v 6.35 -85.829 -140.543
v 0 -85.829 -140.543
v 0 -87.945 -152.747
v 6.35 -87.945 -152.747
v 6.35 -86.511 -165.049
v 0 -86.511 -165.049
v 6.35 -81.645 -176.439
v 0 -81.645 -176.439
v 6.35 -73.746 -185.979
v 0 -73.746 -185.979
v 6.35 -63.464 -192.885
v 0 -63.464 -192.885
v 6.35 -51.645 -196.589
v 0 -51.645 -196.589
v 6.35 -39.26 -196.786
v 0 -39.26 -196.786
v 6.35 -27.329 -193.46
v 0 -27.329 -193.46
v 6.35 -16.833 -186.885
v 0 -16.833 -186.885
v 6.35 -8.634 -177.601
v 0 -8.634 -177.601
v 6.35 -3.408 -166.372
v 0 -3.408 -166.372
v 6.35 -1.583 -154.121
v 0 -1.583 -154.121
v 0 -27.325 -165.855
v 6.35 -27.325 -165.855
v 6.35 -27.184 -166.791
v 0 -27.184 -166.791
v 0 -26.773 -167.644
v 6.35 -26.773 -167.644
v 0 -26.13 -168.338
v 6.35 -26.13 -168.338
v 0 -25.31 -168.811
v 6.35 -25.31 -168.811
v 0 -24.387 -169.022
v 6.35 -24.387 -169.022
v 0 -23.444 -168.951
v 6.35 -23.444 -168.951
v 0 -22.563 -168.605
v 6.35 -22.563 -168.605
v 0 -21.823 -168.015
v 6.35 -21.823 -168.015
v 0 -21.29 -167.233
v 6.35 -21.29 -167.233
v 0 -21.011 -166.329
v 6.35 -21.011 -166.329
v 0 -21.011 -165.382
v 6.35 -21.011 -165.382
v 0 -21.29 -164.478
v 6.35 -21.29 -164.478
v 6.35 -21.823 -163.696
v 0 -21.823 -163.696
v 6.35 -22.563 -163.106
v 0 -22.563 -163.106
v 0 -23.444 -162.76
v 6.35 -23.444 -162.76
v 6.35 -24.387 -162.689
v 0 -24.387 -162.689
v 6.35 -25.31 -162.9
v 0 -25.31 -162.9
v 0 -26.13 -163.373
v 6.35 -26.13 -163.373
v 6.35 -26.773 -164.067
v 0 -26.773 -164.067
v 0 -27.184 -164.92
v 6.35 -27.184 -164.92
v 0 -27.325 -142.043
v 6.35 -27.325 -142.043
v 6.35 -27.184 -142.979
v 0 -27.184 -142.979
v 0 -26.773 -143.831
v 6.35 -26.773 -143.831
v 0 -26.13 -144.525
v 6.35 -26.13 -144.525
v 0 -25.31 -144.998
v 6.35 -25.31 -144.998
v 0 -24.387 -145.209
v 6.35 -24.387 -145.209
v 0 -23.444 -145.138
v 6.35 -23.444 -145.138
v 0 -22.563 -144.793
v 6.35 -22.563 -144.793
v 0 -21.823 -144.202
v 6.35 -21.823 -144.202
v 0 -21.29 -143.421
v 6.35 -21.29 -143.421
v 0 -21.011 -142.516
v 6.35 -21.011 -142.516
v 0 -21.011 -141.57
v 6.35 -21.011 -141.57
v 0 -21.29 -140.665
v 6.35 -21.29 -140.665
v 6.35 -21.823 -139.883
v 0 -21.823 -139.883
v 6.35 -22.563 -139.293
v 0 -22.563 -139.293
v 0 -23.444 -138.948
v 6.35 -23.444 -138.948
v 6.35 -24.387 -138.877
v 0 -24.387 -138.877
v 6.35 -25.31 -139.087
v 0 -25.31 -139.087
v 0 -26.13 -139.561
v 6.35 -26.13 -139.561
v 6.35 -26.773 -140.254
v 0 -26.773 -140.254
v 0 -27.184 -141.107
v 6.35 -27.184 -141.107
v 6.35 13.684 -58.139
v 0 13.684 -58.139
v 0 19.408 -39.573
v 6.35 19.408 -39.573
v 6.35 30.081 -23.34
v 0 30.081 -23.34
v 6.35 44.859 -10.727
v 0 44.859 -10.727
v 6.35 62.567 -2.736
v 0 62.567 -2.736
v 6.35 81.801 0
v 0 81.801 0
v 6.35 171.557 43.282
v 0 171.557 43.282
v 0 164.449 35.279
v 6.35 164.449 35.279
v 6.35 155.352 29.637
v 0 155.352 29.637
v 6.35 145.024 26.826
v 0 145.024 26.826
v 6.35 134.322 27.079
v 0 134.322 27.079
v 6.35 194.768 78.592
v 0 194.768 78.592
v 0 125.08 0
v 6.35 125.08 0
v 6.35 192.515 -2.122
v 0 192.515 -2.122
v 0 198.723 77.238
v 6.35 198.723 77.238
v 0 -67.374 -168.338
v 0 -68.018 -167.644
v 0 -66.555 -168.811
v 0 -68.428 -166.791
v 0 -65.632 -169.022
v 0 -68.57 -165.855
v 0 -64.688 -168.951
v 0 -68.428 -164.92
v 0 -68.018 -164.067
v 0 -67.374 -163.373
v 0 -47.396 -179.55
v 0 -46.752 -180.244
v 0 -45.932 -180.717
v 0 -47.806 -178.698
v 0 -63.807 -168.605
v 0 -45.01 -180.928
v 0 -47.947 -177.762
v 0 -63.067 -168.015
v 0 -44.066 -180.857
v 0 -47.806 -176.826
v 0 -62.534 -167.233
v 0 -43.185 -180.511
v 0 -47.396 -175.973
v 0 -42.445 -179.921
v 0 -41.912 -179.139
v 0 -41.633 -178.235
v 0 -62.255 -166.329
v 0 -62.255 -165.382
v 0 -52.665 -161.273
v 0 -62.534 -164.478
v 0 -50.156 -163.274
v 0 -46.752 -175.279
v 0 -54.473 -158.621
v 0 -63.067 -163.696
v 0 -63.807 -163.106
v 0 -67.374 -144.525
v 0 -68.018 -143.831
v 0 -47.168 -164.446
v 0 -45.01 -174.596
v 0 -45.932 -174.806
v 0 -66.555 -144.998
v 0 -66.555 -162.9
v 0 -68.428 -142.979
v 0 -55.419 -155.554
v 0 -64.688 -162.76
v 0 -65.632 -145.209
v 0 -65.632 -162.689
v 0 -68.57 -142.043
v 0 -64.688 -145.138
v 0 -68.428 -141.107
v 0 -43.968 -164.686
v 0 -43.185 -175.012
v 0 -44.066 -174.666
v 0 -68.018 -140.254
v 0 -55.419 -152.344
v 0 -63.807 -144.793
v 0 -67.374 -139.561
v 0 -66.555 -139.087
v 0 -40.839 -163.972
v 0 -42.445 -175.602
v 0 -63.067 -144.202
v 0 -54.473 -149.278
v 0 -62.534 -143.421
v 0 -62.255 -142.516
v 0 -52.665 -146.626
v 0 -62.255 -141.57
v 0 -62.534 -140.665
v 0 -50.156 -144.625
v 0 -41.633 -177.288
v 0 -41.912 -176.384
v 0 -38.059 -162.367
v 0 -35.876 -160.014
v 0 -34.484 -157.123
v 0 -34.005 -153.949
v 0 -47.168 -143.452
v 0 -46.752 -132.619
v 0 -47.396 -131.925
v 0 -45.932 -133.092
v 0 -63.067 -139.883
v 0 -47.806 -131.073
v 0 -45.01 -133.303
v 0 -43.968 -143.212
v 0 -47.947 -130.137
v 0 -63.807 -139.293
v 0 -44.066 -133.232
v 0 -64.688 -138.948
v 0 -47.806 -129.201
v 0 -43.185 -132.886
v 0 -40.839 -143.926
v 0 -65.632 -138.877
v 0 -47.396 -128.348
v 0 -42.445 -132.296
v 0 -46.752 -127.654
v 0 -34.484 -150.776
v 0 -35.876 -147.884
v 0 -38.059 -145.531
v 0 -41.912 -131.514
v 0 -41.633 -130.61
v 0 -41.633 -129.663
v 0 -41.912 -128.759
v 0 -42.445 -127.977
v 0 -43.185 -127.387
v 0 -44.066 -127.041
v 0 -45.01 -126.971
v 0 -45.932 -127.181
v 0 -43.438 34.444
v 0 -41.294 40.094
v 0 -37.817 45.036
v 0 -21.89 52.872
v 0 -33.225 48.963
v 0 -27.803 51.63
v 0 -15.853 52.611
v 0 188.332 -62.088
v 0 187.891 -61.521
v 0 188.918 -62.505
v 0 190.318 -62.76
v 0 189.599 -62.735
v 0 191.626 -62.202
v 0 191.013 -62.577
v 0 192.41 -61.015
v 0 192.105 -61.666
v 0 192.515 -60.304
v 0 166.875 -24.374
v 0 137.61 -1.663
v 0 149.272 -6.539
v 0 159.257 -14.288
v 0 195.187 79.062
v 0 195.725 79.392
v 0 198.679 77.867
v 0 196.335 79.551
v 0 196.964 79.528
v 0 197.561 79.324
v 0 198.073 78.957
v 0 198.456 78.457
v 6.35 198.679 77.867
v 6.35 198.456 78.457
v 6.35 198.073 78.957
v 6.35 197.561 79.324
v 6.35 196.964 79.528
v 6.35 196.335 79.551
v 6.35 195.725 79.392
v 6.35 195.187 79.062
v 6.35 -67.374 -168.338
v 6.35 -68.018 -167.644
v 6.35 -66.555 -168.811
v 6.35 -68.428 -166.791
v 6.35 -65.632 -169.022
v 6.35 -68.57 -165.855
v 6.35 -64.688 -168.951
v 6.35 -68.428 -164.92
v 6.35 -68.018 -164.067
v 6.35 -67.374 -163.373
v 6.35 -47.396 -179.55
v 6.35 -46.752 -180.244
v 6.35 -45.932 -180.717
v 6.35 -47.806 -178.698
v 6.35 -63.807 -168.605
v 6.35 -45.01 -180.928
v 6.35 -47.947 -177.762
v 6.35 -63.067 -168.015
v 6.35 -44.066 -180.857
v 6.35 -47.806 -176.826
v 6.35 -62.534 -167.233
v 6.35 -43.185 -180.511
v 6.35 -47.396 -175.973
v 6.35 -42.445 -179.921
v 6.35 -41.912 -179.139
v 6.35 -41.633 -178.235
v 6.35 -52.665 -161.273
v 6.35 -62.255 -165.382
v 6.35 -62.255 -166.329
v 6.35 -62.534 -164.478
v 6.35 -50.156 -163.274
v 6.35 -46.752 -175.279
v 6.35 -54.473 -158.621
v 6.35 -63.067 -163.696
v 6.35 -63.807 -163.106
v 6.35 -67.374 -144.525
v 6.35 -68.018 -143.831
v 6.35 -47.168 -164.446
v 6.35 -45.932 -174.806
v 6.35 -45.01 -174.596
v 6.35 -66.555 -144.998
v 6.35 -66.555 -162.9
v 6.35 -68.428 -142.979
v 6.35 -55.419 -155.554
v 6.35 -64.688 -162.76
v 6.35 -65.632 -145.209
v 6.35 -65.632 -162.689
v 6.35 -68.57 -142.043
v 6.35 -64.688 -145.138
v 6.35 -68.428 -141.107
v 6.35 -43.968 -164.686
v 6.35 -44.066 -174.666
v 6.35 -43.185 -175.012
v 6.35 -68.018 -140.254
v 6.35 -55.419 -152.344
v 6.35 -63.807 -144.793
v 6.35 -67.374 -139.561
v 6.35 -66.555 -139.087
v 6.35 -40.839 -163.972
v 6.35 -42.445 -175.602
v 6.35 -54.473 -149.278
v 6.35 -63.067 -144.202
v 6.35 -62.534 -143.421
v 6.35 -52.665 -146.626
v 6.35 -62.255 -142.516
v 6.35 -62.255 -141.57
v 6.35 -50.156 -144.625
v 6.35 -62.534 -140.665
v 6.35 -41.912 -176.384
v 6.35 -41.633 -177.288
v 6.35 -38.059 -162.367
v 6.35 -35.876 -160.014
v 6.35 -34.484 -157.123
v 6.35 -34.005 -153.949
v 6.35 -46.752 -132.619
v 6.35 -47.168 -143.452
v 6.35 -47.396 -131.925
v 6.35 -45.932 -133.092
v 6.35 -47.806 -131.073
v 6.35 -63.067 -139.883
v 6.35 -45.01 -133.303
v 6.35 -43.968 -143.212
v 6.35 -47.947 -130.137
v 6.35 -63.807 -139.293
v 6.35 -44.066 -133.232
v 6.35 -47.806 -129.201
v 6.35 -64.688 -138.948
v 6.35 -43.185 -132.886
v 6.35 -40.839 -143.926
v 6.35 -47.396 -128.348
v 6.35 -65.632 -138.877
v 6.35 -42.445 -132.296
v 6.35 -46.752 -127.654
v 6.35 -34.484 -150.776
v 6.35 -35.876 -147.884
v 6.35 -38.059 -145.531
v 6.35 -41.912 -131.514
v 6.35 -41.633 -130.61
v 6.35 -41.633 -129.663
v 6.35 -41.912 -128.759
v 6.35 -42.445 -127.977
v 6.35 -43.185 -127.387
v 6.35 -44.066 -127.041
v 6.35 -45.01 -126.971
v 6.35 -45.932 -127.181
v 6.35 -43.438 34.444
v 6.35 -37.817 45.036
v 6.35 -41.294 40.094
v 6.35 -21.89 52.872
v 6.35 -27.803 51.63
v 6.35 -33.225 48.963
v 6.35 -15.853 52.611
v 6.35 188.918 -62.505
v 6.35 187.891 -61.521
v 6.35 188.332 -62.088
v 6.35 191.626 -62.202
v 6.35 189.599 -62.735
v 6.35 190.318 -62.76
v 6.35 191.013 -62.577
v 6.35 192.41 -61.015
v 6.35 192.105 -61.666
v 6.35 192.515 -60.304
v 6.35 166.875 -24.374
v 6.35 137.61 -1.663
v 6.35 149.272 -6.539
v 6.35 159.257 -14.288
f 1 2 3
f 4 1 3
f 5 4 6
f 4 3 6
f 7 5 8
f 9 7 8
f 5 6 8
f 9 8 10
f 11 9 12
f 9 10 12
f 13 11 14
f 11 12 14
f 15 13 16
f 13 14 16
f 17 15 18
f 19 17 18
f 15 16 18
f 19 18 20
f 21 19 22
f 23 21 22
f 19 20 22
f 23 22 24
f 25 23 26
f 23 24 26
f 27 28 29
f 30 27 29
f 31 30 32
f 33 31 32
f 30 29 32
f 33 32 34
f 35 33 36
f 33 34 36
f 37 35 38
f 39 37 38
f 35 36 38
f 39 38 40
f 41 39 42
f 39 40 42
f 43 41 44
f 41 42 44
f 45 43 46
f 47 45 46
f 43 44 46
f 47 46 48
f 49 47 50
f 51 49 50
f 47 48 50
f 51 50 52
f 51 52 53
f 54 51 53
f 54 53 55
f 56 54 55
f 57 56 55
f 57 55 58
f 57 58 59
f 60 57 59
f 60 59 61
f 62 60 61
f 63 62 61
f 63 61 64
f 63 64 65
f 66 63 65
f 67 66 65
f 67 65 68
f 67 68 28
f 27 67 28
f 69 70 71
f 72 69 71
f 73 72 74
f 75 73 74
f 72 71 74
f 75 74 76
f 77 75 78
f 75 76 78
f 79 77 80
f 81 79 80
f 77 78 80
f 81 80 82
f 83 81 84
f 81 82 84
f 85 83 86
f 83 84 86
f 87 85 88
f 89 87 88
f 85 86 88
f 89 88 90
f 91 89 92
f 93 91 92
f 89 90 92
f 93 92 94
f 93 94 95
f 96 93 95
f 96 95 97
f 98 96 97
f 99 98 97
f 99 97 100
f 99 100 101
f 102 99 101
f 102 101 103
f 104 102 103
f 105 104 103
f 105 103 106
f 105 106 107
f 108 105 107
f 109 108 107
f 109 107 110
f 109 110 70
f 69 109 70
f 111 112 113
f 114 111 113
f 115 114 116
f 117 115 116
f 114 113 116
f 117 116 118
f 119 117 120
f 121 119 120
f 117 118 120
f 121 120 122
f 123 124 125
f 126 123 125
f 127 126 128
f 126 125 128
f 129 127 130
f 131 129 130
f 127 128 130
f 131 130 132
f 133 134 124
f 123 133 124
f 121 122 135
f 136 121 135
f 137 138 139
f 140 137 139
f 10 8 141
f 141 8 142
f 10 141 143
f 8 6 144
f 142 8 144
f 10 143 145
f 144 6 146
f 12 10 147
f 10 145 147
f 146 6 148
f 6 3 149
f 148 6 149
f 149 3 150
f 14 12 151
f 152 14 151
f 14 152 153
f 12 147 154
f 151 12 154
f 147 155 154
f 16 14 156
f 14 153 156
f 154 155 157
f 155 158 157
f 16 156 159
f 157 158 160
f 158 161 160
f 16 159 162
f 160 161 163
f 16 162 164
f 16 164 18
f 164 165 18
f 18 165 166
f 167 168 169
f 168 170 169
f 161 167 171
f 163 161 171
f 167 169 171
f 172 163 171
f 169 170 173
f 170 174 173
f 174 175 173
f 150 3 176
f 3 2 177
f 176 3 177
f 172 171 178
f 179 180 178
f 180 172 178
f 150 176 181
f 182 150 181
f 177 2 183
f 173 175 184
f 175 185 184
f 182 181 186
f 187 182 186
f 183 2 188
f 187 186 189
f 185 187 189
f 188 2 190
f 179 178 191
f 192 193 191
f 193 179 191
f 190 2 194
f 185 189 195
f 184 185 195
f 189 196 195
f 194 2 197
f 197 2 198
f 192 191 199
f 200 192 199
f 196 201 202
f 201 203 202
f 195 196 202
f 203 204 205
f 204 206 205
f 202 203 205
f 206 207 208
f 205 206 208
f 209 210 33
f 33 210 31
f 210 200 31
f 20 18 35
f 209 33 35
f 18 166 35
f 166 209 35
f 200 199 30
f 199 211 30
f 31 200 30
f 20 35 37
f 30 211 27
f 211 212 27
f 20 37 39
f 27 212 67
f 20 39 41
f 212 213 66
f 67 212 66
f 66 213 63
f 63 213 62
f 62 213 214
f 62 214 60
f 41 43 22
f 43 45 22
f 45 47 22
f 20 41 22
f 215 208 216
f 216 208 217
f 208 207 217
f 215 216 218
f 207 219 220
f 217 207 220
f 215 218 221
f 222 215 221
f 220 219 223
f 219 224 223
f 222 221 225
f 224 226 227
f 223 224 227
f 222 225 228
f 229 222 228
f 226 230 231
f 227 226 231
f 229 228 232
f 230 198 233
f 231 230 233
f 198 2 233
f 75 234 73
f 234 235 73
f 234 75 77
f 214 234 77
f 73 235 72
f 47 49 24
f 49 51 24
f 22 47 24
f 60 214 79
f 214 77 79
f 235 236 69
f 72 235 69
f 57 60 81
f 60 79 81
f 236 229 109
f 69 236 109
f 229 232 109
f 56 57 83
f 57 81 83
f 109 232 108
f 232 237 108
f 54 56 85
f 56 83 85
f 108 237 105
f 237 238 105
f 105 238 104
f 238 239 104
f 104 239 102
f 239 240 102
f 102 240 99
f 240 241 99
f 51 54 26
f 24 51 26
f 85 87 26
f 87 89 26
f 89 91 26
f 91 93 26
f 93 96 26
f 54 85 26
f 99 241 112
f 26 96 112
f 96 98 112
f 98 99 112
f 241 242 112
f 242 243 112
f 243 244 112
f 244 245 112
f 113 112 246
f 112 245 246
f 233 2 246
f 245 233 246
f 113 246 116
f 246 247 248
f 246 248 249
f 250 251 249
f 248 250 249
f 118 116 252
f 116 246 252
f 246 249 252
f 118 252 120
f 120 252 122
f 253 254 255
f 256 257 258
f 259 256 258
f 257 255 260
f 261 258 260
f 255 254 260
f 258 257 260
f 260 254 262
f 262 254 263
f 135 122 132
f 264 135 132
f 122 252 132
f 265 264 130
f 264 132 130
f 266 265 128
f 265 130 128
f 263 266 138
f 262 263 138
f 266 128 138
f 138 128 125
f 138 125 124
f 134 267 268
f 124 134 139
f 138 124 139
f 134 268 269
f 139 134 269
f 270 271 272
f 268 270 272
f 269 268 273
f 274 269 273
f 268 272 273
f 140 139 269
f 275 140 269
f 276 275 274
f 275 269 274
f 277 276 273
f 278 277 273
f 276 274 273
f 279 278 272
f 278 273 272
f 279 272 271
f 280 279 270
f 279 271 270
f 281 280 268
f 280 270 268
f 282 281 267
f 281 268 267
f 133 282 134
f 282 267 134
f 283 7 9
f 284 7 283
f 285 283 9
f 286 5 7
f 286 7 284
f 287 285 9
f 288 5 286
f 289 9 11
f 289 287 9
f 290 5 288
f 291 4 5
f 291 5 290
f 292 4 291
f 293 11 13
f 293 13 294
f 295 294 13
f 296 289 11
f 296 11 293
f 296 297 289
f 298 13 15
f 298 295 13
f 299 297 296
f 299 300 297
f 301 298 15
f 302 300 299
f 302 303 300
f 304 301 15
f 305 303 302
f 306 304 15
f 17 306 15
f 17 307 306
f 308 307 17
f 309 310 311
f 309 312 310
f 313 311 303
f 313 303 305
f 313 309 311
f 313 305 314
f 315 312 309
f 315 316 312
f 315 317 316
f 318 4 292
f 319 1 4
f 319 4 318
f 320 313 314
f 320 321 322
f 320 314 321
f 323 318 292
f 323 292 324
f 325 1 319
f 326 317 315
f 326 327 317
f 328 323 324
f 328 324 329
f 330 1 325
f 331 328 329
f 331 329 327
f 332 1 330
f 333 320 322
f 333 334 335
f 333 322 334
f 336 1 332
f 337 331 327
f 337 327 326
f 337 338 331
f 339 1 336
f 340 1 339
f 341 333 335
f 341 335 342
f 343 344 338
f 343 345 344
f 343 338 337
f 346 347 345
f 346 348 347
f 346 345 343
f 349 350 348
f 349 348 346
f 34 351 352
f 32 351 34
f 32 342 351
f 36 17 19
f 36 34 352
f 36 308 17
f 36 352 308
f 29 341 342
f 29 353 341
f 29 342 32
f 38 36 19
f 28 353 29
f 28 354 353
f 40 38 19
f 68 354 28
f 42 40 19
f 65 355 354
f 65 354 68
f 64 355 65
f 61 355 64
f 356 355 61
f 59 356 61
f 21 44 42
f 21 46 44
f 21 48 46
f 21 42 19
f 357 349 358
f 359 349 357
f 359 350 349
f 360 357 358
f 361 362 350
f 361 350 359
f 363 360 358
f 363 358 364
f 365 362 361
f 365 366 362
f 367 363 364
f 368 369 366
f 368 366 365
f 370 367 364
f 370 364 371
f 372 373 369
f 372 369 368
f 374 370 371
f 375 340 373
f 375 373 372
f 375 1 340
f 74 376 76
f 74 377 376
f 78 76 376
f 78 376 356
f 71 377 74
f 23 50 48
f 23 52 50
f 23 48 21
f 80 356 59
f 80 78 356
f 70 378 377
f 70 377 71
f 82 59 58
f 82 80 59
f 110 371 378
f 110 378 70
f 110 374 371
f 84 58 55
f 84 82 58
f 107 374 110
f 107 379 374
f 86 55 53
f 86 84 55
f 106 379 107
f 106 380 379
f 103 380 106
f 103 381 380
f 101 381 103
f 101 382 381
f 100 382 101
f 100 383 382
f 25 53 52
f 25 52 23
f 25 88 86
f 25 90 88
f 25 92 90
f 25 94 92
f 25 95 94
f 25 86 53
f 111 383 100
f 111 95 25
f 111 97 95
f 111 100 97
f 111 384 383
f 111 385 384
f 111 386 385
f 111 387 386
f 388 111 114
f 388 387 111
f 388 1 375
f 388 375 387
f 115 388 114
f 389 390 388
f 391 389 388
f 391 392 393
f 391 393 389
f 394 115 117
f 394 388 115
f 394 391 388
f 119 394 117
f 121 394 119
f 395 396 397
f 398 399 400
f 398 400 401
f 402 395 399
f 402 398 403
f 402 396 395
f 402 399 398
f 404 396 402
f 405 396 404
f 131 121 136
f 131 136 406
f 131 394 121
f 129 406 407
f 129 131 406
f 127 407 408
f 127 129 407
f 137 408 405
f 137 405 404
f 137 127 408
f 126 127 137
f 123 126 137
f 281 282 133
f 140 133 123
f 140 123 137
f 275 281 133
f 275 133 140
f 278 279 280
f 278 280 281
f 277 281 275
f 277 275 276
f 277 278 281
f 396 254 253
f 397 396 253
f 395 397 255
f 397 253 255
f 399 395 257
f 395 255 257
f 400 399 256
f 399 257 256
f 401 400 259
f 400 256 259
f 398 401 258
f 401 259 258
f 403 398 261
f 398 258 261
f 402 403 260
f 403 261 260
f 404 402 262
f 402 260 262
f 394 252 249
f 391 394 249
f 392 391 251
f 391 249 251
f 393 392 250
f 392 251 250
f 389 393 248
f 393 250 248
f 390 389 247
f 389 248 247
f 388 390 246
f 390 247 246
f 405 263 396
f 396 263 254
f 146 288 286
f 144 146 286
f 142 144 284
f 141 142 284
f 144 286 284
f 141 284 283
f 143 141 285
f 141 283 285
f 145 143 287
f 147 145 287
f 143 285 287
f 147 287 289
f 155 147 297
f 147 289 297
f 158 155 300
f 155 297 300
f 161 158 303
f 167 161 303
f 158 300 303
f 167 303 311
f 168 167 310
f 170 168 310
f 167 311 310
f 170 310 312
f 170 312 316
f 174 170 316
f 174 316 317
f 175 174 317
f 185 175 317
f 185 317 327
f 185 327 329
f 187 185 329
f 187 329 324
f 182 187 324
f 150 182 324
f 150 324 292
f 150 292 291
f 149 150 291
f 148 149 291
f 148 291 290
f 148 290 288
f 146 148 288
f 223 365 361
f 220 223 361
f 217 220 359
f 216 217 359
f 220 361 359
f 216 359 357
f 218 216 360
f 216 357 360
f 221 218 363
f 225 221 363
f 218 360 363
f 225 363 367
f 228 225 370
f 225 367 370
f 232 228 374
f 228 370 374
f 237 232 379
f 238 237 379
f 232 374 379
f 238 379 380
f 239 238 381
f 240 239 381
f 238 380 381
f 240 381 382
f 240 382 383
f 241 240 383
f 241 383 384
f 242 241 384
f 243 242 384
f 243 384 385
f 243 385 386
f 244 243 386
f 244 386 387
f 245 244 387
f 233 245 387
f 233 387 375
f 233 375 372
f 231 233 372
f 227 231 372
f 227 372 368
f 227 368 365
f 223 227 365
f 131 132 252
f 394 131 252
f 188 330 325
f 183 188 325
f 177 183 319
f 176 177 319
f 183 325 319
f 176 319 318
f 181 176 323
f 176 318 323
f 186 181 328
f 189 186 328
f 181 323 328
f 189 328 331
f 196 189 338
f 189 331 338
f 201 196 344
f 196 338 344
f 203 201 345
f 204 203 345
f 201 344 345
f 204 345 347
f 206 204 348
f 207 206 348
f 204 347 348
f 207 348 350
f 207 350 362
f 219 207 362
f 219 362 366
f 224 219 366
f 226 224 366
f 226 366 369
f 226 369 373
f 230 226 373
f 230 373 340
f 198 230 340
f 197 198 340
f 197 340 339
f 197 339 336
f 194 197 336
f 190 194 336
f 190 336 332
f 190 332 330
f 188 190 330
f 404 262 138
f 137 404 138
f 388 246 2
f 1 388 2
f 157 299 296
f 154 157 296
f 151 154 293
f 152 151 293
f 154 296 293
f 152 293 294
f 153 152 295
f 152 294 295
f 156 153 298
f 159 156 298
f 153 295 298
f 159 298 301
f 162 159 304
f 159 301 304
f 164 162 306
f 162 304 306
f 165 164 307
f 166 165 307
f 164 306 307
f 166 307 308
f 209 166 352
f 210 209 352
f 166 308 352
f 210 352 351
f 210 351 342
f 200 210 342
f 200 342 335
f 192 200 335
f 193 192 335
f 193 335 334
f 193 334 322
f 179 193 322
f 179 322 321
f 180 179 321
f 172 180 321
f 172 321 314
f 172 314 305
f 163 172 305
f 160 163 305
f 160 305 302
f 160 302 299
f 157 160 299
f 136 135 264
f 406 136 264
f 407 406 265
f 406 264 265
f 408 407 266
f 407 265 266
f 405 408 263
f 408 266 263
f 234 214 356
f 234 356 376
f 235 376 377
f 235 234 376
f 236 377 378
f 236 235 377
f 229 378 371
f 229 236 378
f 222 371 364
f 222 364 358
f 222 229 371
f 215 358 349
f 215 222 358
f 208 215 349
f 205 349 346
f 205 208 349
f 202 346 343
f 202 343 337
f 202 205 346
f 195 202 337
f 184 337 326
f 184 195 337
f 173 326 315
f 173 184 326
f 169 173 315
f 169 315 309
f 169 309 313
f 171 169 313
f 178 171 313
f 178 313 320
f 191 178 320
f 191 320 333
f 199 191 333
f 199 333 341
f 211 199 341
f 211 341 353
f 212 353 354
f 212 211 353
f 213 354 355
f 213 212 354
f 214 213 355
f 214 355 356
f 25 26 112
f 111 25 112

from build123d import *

# Parameters (mm, degrees)
F1_DEPTH = 6.35
F2_DEPTH = 6.35
F0_R     = 10.7670897693
F5_DEPTH = 6.35
F6_D     = 6.35


# Not quite as in the source:
# - a feature of the source that left no trace in its solid (it failed there, or was rolled back) is left out


with BuildPart() as f1:
    # F0 (on Right) → F1 (new body)
    with BuildSketch(Plane.YZ):
        with BuildLine():
            ThreePointArc((-1.5825573364, -153.9491721496), (-1.5826429755, -154.035180638), (-1.5828998925, -154.1211887854))
            Line((-1.5828998925, -154.1211887854), (13.683948877, -58.1386835494))
            ThreePointArc((13.683948877, -58.1386835494), (37.0236297514, -16.510860014), (81.800944289, 0))
            Line((81.800944289, 0), (125.0803981306, 0))
            ThreePointArc((125.0803981306, 0), (149.2715136598, -6.5386249673), (166.8746197449, -24.3738245223))
            Line((166.8746197449, -24.3738245223), (187.8910975974, -61.5208026845))
            ThreePointArc((187.8910975974, -61.5208026845), (190.6720383022, -62.6941019502), (192.5146989034, -60.3035237191))
            Line((192.5146989034, -60.3035237191), (192.5146989034, -2.1215420715))
            Line((192.5146989034, -2.1215420715), (198.7226175975, 77.2382490494))
            ThreePointArc((198.7226175975, 77.2382490494), (197.2700771229, 79.4482102797), (194.7679715475, 78.5918983278))
            Line((194.7679715475, 78.5918983278), (171.5573410493, 43.2821044094))
            ThreePointArc((171.5573410493, 43.2821044094), (155.3522029023, 29.6366600871), (134.3221352203, 27.0791405068))
            Line((134.3221352203, 27.0791405068), (-15.8528228172, 52.6105930486))
            ThreePointArc((-15.8528228172, 52.6105930486), (-33.2247403603, 48.9627075804), (-43.4379661828, 34.4444223576))
            Line((-43.4379661828, 34.4444223576), (-85.8287484087, -140.5429926023))
            ThreePointArc((-85.8287484087, -140.5429926023), (-37.9848929099, -111.2960762471), (-1.5825573364, -153.9491721496))
        make_face()
    extrude(amount=F1_DEPTH)

    # F0 (on Right) → F2 (join)
    with BuildSketch(Plane.YZ):
        with BuildLine():
            ThreePointArc((-1.5825573364, -153.9491721496), (-1.5826429755, -154.035180638), (-1.5828998925, -154.1211887854))
            Line((-1.5828998925, -154.1211887854), (13.683948877, -58.1386835494))
            ThreePointArc((13.683948877, -58.1386835494), (37.0236297514, -16.510860014), (81.800944289, 0))
            Line((81.800944289, 0), (125.0803981306, 0))
            ThreePointArc((125.0803981306, 0), (149.2715136598, -6.5386249673), (166.8746197449, -24.3738245223))
            Line((166.8746197449, -24.3738245223), (187.8910975974, -61.5208026845))
            ThreePointArc((187.8910975974, -61.5208026845), (190.6720383022, -62.6941019502), (192.5146989034, -60.3035237191))
            Line((192.5146989034, -60.3035237191), (192.5146989034, -2.1215420715))
            Line((192.5146989034, -2.1215420715), (198.7226175975, 77.2382490494))
            ThreePointArc((198.7226175975, 77.2382490494), (197.2700771229, 79.4482102797), (194.7679715475, 78.5918983278))
            Line((194.7679715475, 78.5918983278), (171.5573410493, 43.2821044094))
            ThreePointArc((171.5573410493, 43.2821044094), (155.3522029023, 29.6366600871), (134.3221352203, 27.0791405068))
            Line((134.3221352203, 27.0791405068), (-15.8528228172, 52.6105930486))
            ThreePointArc((-15.8528228172, 52.6105930486), (-33.2247403603, 48.9627075804), (-43.4379661828, 34.4444223576))
            Line((-43.4379661828, 34.4444223576), (-85.8287484087, -140.5429926023))
            ThreePointArc((-85.8287484087, -140.5429926023), (-37.9848929099, -111.2960762471), (-1.5825573364, -153.9491721496))
        make_face()
    extrude(amount=F2_DEPTH)

    # F0 (on Right) → F5 (join)
    with BuildSketch(Plane.YZ):
        with BuildLine():
            ThreePointArc((-85.8287484087, -140.5429926023), (-51.6446777228, -196.588666929), (-1.5828998925, -154.1211887854))
            ThreePointArc((-1.5828998925, -154.1211887854), (-1.5826429755, -154.035180638), (-1.5825573364, -153.9491721496))
            ThreePointArc((-1.5825573364, -153.9491721496), (-37.9848929099, -111.2960762471), (-85.8287484087, -140.5429926023))
        make_face()
        with Locations((-44.772322165, -153.9491721496)):
            Circle(F0_R, mode=Mode.SUBTRACT)
    extrude(amount=F5_DEPTH)

    # F6 (through all)
    with Locations(Plane(origin=(0, 0, 0), x_dir=(0, 1, 0), z_dir=(-1, 0, 0))):
        with Locations((-44.772322165, 130.1366721496), (-24.1500922374, 142.0429221496), (-24.1500922374, 165.8554221496), (-44.772322165, 177.7616721496), (-65.3945520927, 165.8554221496), (-65.3945520927, 142.0429221496)):
            Hole(F6_D / 2)


solid = f1.part
